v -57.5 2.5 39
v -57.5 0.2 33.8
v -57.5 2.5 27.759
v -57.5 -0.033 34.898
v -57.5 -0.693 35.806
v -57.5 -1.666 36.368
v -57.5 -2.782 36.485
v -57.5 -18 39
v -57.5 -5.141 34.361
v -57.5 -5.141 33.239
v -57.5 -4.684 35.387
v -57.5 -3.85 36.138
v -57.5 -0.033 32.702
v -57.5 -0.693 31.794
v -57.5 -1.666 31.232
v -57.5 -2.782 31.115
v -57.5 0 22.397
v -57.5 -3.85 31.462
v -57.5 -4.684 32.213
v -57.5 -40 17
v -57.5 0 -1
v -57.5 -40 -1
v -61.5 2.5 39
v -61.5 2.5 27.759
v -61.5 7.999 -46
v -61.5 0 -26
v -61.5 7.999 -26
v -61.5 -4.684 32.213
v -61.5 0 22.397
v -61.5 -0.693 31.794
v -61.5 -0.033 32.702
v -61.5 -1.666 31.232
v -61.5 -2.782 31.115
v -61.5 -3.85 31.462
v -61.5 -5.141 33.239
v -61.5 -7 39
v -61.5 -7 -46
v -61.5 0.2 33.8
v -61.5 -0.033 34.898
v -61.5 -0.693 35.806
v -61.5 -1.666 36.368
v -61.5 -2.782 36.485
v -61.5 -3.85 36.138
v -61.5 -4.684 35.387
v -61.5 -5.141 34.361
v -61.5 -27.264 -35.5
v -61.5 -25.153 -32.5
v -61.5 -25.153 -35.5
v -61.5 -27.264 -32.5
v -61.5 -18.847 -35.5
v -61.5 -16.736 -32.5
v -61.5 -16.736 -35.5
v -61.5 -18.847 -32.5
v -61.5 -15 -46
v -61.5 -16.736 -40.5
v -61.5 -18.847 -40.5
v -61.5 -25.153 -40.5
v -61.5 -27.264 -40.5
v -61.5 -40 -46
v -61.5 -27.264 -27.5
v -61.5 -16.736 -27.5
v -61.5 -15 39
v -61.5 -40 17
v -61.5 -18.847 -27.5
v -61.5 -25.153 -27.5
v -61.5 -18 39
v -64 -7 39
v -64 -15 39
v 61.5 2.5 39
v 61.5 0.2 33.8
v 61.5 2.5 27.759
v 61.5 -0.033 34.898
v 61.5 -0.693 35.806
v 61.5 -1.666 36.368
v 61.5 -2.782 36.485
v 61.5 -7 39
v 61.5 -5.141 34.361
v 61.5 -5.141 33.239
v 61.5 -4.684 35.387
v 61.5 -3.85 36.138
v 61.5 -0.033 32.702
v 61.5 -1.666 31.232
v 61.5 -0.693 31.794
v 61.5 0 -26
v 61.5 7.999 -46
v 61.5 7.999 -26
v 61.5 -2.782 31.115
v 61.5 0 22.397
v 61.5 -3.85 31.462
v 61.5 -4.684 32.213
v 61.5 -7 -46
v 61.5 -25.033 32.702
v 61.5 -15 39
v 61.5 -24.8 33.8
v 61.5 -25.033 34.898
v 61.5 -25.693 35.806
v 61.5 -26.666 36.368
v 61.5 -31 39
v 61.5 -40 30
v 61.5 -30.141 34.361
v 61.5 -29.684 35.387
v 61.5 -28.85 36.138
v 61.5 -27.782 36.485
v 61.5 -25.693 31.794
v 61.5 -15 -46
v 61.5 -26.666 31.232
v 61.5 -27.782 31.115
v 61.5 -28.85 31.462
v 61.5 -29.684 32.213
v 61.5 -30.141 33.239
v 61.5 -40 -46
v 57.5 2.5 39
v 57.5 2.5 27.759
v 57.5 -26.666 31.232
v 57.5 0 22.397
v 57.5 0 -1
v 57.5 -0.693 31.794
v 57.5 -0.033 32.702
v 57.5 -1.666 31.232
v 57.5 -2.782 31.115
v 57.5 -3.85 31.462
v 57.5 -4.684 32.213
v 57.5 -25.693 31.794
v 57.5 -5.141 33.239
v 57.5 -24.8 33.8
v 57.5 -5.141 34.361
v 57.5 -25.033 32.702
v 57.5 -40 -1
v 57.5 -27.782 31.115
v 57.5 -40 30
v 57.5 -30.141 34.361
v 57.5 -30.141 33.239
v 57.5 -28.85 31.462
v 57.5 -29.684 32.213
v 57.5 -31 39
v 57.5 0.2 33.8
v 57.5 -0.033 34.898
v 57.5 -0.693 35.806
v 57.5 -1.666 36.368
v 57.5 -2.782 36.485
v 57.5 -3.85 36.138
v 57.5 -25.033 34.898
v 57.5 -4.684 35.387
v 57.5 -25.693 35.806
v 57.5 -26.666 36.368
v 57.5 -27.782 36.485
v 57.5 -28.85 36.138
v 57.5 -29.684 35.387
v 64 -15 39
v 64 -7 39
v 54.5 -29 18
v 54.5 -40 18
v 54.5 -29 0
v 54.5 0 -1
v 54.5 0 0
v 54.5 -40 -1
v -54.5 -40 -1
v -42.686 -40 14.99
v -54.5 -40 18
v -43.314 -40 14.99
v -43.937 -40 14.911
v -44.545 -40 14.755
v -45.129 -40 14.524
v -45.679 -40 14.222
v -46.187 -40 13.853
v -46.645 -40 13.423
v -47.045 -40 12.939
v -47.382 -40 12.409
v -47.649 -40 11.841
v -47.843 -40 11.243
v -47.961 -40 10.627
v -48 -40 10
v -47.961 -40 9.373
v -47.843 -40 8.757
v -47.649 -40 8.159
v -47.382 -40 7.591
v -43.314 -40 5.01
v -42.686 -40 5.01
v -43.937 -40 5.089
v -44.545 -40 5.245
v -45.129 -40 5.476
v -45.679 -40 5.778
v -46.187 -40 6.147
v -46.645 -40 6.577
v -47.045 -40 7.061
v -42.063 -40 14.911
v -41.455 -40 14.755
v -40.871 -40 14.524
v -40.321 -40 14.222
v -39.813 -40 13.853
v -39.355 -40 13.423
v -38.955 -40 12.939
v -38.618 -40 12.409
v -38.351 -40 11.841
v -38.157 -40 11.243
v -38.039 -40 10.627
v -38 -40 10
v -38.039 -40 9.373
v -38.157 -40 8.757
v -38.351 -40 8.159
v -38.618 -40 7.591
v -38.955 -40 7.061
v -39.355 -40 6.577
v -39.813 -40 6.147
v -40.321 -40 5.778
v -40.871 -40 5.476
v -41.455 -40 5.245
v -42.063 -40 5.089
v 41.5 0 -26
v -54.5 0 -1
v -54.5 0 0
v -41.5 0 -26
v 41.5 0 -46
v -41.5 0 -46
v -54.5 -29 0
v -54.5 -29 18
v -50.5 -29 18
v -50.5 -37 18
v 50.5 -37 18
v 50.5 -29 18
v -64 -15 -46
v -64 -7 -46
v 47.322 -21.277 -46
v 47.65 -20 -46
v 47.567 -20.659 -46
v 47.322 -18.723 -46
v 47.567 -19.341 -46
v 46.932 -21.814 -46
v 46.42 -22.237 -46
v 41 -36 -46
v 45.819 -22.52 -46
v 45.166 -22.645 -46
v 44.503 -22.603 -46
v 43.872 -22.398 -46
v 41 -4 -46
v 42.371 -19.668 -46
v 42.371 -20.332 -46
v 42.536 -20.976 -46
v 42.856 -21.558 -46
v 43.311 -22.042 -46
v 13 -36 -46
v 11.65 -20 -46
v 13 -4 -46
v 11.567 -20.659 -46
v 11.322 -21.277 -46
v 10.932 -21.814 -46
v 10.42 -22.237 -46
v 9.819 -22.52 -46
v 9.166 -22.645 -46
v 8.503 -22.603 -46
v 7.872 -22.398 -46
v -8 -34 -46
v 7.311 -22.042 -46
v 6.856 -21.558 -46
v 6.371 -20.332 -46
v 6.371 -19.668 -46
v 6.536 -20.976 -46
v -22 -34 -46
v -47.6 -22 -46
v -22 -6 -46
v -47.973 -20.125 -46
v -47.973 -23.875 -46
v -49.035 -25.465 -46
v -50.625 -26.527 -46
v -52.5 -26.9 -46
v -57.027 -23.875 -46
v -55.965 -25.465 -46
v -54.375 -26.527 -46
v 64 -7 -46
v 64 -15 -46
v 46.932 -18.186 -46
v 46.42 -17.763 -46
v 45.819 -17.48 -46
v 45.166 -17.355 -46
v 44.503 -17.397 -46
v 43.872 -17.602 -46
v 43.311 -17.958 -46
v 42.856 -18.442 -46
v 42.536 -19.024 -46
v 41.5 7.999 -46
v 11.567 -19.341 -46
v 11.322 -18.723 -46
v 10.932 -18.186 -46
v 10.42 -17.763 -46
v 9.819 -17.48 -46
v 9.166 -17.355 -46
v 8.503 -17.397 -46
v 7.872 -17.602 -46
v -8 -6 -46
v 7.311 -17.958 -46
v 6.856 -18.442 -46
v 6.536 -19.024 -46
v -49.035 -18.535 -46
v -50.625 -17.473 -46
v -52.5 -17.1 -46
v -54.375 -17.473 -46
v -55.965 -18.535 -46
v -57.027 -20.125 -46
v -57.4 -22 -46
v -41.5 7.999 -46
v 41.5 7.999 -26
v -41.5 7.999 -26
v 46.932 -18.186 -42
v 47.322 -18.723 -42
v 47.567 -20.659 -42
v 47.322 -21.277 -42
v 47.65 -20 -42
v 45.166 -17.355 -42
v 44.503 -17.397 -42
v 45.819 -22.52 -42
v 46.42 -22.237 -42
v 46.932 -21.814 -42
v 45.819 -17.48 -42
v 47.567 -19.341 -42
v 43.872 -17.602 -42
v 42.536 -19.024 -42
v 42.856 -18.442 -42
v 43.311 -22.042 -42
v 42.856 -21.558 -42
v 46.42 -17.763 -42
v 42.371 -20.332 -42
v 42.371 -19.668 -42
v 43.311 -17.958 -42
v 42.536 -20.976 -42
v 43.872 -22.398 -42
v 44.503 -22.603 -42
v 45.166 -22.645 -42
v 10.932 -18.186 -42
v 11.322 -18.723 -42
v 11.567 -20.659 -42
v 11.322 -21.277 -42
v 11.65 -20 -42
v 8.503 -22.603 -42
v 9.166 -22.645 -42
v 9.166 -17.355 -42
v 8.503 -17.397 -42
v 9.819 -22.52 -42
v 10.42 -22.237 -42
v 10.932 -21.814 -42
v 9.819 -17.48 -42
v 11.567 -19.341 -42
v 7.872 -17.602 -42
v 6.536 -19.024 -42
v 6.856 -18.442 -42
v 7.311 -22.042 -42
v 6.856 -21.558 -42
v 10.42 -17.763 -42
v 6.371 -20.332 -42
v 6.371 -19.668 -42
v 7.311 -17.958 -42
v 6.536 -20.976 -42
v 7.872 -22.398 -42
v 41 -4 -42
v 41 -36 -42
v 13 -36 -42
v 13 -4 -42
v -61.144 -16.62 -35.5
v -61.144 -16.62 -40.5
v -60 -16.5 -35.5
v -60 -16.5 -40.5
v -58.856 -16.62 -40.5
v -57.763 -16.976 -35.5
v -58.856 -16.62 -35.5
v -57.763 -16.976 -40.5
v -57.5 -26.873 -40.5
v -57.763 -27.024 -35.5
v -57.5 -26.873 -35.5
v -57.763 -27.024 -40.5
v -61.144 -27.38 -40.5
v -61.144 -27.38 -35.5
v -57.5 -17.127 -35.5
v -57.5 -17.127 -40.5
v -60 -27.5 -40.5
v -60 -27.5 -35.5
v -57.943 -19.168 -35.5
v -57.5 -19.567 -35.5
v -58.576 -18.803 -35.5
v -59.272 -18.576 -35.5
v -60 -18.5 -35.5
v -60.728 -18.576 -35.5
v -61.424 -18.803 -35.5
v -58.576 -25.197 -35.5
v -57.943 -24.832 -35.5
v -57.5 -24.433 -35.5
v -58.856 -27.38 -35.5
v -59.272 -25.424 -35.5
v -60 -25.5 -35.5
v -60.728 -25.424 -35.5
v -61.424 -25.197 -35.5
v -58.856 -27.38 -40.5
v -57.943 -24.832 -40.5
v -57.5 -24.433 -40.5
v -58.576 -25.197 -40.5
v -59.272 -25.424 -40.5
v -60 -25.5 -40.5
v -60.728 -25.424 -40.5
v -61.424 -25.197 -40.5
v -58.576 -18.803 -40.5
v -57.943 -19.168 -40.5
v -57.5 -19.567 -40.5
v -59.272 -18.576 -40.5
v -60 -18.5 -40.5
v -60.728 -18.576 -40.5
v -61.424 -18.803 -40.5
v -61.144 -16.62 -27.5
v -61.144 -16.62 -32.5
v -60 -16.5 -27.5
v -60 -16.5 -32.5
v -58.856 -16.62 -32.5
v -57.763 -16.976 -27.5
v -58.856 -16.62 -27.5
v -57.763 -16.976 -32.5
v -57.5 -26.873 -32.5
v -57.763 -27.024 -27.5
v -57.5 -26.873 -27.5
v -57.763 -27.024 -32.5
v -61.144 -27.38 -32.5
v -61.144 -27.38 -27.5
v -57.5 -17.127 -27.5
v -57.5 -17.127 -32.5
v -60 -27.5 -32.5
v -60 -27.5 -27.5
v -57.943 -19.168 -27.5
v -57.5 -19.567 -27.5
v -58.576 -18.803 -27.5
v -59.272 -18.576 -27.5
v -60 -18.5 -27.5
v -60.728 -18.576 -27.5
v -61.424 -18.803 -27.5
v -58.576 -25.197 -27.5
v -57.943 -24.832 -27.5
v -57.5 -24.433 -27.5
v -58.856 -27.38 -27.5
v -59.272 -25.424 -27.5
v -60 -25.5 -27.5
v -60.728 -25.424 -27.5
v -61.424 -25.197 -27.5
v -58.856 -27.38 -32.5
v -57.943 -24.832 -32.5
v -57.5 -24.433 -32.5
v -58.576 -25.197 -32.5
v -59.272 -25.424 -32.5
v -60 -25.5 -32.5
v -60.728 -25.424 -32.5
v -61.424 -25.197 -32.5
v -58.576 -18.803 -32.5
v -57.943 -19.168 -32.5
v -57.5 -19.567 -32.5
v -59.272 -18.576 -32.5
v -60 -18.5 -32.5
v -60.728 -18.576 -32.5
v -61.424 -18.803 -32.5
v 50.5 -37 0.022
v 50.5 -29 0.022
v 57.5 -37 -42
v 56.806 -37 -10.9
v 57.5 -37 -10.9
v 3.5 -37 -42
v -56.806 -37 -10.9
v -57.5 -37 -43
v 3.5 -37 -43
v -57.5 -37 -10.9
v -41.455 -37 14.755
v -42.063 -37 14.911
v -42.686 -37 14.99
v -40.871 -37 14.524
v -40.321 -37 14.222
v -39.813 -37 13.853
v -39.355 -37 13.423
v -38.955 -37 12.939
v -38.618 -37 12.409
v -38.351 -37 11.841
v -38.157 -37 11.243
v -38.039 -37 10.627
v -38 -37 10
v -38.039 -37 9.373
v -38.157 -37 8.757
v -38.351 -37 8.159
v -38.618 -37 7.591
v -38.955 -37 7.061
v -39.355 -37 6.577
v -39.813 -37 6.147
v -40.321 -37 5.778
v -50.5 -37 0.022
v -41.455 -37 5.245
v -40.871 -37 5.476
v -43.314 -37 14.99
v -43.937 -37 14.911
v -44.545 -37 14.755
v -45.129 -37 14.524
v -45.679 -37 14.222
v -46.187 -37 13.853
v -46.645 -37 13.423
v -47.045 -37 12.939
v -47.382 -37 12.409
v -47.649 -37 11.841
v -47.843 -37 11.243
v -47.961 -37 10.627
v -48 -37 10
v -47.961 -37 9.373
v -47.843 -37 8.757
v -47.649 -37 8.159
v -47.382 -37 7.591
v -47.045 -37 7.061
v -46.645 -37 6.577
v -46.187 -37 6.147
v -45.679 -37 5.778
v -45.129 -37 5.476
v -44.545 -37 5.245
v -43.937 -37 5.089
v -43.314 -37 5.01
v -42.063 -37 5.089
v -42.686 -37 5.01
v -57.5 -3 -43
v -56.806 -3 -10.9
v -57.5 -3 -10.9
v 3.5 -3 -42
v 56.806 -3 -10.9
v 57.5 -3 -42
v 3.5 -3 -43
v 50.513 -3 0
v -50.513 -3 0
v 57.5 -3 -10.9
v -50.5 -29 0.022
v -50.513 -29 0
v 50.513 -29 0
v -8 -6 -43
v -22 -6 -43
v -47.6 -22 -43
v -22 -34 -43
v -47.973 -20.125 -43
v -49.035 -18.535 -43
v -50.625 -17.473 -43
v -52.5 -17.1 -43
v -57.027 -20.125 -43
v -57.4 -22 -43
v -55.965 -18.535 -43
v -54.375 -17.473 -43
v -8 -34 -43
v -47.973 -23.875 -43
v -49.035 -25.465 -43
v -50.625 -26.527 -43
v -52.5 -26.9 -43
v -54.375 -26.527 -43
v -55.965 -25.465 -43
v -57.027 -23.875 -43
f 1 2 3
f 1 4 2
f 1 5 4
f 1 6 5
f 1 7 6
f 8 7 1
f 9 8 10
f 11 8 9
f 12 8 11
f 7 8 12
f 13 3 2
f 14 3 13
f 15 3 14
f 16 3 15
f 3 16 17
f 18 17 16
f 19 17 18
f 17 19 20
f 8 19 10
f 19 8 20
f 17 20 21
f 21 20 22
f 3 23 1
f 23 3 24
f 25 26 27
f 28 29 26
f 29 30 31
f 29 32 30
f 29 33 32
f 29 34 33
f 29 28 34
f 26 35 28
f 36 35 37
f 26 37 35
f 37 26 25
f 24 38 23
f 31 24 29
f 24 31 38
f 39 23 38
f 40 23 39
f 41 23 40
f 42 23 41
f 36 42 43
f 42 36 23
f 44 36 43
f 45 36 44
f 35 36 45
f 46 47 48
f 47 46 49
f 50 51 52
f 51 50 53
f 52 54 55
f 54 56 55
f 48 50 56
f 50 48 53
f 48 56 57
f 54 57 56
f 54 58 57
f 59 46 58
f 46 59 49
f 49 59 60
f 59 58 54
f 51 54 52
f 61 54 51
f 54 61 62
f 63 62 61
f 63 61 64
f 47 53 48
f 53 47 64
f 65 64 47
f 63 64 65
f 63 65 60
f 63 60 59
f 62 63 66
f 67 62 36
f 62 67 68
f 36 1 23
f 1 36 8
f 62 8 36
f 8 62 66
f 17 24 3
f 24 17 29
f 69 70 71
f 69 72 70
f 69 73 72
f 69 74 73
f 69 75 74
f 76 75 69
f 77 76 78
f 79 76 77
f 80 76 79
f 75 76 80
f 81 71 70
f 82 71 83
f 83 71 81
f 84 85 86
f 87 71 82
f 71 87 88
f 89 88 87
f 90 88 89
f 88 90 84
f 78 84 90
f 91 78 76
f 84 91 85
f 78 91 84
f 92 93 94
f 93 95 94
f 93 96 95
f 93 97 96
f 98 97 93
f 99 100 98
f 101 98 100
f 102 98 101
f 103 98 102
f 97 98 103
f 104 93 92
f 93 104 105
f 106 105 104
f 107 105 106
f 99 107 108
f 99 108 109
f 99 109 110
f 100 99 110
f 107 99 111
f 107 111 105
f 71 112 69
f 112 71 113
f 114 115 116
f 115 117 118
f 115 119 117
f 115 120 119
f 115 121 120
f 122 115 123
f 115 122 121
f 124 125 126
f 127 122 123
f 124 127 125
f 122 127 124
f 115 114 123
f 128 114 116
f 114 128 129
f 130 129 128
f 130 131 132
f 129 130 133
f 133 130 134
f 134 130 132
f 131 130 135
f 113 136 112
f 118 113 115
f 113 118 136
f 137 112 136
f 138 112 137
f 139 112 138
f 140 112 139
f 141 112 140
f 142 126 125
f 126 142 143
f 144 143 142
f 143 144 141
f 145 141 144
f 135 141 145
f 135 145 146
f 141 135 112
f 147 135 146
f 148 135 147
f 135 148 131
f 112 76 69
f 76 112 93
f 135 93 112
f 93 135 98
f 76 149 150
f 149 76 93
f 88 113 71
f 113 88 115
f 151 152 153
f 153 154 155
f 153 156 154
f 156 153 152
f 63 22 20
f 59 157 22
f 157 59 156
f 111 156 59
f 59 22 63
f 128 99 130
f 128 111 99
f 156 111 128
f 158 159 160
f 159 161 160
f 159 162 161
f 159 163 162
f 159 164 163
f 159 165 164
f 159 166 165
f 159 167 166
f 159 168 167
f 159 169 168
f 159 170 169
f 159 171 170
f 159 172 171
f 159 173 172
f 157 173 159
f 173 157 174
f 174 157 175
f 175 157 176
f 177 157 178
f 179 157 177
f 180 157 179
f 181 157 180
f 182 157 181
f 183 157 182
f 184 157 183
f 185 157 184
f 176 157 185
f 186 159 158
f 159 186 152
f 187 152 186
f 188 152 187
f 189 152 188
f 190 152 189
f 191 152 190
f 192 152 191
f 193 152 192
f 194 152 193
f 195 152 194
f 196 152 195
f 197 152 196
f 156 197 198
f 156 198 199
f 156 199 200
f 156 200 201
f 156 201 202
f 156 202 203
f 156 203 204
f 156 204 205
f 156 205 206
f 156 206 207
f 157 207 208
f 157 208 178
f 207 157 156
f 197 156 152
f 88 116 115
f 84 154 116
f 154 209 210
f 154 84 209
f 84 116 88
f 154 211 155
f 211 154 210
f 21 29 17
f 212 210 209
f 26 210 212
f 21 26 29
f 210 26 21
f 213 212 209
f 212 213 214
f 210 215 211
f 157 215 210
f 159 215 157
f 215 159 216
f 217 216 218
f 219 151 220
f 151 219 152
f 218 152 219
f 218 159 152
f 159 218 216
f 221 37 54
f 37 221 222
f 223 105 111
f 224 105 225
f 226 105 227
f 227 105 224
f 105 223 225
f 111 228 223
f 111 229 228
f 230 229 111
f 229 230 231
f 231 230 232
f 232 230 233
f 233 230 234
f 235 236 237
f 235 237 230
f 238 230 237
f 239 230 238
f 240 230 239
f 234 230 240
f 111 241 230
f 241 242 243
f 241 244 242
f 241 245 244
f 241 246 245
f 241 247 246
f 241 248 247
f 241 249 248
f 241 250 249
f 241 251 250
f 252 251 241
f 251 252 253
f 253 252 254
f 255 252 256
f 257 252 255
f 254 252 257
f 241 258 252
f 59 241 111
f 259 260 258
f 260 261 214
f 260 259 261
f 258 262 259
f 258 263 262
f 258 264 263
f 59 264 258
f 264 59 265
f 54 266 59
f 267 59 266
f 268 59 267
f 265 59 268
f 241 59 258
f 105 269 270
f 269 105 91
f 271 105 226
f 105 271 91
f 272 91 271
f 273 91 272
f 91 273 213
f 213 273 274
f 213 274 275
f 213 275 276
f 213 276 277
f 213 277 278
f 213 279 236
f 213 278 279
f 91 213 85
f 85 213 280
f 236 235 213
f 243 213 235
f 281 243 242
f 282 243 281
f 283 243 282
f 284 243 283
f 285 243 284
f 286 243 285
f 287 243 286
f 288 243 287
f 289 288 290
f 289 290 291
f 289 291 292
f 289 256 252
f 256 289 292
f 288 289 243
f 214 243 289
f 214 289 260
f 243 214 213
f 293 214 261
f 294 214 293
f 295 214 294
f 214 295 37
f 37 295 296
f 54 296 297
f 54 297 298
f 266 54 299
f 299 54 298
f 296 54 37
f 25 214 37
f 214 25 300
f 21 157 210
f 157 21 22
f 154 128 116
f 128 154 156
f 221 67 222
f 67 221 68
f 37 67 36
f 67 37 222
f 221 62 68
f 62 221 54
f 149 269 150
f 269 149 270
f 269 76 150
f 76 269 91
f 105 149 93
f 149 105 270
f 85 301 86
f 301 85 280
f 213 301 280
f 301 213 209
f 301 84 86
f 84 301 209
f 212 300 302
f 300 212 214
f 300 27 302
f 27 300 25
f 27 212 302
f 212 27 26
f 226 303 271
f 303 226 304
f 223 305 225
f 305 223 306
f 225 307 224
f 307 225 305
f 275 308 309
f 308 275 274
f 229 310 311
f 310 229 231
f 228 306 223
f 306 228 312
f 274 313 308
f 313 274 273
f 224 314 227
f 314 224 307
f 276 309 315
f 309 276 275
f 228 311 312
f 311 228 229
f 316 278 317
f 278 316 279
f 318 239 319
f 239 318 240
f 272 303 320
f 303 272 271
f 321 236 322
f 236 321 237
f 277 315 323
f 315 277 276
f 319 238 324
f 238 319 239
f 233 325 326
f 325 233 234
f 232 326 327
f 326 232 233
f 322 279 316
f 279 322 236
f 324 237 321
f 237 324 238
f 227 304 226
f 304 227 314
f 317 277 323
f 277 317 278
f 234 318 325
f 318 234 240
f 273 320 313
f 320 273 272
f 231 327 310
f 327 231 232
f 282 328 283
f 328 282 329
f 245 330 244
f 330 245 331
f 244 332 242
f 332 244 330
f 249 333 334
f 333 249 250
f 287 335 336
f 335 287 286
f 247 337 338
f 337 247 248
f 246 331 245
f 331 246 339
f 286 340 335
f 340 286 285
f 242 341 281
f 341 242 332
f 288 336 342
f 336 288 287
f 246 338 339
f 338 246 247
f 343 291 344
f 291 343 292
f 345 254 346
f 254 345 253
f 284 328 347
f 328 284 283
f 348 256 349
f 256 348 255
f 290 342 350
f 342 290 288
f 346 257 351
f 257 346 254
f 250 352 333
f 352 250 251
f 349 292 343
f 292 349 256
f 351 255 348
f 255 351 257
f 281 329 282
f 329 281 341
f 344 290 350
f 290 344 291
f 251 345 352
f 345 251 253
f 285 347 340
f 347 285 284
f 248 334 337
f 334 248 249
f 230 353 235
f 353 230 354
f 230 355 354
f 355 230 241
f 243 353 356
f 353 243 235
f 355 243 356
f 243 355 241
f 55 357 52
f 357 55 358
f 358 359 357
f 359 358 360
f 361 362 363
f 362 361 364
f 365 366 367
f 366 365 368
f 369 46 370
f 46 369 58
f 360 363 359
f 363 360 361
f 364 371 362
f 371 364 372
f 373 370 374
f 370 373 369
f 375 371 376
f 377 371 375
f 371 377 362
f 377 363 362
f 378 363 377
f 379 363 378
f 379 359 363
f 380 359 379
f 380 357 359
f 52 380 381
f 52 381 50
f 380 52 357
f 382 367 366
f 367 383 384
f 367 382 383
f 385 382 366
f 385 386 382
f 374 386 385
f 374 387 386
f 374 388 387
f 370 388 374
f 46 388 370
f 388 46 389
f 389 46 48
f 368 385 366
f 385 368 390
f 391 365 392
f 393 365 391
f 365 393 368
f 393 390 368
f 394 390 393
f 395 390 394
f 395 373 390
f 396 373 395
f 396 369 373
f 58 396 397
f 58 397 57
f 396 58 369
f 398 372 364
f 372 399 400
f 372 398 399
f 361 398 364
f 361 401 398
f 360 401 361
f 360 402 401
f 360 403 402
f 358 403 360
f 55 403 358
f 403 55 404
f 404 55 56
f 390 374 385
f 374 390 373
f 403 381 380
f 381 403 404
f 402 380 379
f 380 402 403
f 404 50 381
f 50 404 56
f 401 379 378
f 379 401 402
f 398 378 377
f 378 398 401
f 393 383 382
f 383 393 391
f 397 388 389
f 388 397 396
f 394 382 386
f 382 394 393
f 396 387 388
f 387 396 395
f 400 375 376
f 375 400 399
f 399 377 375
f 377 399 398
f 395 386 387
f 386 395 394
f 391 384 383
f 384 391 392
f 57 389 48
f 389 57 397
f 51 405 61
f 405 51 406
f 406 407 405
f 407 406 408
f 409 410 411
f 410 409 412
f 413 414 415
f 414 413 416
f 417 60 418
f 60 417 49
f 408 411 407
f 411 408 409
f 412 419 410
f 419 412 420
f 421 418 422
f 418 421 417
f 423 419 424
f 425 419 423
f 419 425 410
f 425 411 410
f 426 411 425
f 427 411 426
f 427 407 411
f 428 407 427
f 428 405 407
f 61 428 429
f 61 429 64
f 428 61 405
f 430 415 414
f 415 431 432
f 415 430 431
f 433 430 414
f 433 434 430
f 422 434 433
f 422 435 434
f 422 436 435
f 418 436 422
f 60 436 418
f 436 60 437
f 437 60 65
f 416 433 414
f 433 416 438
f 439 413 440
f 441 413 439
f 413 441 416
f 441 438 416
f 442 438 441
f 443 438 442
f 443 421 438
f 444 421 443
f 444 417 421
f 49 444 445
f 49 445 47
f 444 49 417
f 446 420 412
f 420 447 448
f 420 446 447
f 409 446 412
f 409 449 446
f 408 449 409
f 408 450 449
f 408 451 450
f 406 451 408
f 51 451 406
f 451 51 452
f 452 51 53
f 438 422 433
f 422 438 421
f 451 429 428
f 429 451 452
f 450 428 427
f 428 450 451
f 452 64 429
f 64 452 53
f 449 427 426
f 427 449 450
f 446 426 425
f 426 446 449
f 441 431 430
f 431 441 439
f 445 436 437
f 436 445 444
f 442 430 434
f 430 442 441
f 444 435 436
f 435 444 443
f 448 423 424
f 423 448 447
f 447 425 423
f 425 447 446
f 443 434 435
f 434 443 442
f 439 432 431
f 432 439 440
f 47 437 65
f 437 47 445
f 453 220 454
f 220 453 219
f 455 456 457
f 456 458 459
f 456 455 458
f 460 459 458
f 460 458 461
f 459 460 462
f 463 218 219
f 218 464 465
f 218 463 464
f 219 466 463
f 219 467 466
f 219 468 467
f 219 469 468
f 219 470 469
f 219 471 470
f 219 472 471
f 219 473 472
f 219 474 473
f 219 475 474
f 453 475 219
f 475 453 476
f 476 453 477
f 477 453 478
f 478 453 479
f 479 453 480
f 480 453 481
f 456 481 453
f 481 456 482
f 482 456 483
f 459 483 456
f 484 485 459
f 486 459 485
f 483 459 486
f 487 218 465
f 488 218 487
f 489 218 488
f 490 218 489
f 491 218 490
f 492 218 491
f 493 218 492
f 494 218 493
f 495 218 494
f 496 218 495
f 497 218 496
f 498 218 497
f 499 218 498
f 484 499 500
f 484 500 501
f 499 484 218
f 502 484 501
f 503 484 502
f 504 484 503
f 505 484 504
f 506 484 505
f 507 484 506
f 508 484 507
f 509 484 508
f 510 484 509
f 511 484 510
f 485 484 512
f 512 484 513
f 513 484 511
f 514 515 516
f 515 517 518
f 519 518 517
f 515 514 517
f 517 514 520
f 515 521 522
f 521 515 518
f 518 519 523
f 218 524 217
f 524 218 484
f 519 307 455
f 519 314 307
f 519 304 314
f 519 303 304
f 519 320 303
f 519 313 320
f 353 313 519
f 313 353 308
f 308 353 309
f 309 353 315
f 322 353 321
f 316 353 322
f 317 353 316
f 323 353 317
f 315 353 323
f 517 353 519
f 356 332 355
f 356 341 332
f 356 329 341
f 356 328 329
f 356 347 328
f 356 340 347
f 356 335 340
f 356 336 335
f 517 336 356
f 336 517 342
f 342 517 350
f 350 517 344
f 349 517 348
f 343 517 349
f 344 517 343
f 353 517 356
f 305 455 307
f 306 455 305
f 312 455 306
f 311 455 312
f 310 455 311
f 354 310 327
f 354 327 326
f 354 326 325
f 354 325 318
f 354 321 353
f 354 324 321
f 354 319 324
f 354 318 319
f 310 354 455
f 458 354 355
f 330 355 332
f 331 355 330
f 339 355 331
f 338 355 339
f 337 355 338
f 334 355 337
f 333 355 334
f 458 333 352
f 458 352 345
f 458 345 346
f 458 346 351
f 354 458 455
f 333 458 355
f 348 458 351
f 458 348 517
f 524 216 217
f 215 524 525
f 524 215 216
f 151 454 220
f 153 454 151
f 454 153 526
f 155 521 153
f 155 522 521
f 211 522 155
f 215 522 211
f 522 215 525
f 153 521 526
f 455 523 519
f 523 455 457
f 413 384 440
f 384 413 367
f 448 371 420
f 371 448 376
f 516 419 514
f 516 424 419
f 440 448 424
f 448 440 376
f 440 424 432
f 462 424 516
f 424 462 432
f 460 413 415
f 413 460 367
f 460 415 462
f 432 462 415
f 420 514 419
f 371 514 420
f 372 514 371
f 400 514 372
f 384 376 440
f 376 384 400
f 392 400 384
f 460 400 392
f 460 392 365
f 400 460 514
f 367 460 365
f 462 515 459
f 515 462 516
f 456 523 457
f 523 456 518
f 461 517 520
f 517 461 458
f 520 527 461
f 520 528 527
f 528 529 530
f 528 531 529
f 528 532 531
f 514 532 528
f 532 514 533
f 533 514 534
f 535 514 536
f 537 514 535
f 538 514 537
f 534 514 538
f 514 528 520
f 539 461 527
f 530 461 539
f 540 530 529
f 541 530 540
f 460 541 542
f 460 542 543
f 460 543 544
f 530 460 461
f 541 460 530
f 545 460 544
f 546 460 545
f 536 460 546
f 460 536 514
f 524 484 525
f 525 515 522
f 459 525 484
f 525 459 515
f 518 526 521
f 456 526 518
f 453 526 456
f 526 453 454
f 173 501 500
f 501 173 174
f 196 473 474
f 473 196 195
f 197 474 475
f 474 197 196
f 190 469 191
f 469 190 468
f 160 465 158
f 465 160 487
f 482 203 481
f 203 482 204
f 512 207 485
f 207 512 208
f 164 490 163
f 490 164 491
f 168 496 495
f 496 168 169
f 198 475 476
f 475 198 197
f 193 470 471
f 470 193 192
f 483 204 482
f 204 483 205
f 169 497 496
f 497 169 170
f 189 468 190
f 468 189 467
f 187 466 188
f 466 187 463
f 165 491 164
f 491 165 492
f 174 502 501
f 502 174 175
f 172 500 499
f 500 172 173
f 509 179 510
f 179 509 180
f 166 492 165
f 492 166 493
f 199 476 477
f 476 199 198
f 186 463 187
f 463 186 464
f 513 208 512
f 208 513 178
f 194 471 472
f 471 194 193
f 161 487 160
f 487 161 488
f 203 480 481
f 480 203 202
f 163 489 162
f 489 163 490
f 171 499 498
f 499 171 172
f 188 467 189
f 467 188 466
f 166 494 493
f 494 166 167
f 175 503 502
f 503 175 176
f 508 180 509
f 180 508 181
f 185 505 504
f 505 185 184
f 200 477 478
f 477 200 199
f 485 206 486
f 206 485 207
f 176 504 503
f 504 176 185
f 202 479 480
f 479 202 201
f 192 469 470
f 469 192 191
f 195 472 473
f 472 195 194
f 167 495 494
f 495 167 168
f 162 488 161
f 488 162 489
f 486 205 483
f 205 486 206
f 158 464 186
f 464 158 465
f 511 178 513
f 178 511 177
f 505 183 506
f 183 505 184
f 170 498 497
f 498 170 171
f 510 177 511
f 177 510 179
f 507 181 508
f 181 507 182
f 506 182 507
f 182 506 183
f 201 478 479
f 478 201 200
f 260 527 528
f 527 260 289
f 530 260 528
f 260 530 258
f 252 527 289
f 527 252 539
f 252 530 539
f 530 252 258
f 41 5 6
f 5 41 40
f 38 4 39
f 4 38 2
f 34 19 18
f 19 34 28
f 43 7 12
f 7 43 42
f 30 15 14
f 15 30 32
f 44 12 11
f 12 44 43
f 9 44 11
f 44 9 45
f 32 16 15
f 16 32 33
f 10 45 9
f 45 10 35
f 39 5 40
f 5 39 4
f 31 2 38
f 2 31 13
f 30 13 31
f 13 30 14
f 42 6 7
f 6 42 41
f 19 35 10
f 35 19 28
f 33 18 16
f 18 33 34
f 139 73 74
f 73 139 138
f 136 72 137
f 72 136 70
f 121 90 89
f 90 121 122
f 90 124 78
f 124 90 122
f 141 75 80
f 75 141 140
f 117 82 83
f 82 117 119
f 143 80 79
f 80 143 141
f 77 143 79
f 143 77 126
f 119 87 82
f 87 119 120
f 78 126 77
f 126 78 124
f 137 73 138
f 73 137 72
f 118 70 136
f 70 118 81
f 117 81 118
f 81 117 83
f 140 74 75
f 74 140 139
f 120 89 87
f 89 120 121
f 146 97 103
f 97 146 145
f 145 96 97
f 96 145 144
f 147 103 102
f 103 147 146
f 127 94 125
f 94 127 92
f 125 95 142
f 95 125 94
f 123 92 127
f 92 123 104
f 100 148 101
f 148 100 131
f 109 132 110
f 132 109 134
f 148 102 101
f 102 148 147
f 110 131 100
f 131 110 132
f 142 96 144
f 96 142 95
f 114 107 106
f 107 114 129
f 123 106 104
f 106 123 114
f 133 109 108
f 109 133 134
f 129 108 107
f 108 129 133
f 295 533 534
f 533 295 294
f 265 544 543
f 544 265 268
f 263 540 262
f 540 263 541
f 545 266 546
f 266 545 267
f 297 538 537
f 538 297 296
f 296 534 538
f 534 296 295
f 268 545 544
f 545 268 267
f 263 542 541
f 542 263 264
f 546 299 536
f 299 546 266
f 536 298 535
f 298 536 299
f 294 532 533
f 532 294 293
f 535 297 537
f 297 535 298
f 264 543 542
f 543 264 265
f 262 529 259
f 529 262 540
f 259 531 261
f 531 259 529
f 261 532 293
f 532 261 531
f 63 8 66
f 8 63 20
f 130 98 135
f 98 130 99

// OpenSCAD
module psu(){
union(){
	difference(){
		translate([-114/2,0,-8])cube([114,200,50]);
		translate([-55,-0.01,2.01])cube([110,18,40]);
	}
	translate([-38,-0.01,2.01])cube([90,18,9]);
	translate([-37.5,2,2.01])
		for( i=[0:8]) translate([i*10,0,0])
		cube([9,10,10]);
}
translate([-65,32,5])rotate([0,90,0])cylinder(r=2,$fn=15,h=130);
translate([-35,32,30])rotate([0,90,0])cylinder(r=2,$fn=15,h=100);
translate([-114/2+32,32,-16])rotate([0,0,0])cylinder(r=2,$fn=15,h=15);
translate(){
translate([-57,1.5+6,30-12])rotate([0,90,0])oval();
translate([-57,1.5+6+7,30-12])rotate([0,90,0])oval();
translate([-57,1.5+6+14,30-12])rotate([0,90,0])oval();
translate([55,1.5+6,30-12])rotate([0,90,0])oval();
translate([55,1.5+6+7,30-12])rotate([0,90,0])oval();
translate([55,1.5+6+14,30-12])rotate([0,90,0])oval();
}
}

*%psu();
*enclosure();
module plug(){
cube([28,41,32],center=true);
for(i=[-1,1])translate([-18*i,-11,0])rotate([90,0,0])cylinder(r=5.3/2,h=10,$fn=25);
}
module switch(){
cylinder(r=20.5/2,h=39);
translate([0,-2.4/2,0])cube([11.5,2.4,39]);
}
module rswitch(){
translate([0,0,39/2])cube([28,14,39],true);
}

module clover(d=2,x=1.2){
for(i=[-1,1])
	for(j=[-1,1])
		translate([i*x,j*x])
			cylinder(r=d,h=30);

}

module ring(d=10,h=4,o=1.5){
difference(){
cylinder(r=d,h=h,center=true,$fn=30);
cylinder(r=d-o,h=h+1,center=true,$fn=30);


}

module support(){
translate([-63,0,0])cube([3,8,84]);
translate([63,0,0])cube([3,8,84]);


}

}
module oval(rad=3,len=21,w=2,fn=20){
translate([len/2,0,0])cylinder(r=rad/2,h=w,$fn=fn);
translate([-len/2,0,0])cylinder(r=rad/2,h=w,$fn=fn);
translate([0,0,w/2])cube([len,rad,w],center=true);
}
module enclosure(){
difference(){
union(){
translate([-109/2,-46,0])cube([109,64,40]);
translate([-115.5/2,-46,0])cube([115.5,45,40]);
translate([-109/2-7,-46,0])cube([4,85,40]); // extented Y by 1
translate([-64,39,7])rotate([90,0,0])cube([3,8,85]);
translate([61,39,7])rotate([90,0,0])cube([3,8,85]);
difference(){
	translate([-109/2-7,19,-2.5])cube([4,20,20]);
	translate([-109/2-7.25,17,-3]) rotate([-25,0,0]) cube([4.5,10,5]);
}
translate([109/2+3,-46,0])cube([4,85,40]); // extended Y by 1
difference(){	
	translate([109/2+3,19,-2.5])cube([4,20,20]);
	translate([109/2+2.75,17,-3]) rotate([-25,0,0]) cube([4.5,10,5]);
}
translate([34.5+7,-46,-7.999])cube([20,20,8]);
translate([-61.5,-46,-7.999])cube([20,20,8]);
}
translate([-101/2,-42,3])cube([101,60.1,34]);
translate([-110/2,0,-5])cube([110,30,34]);
translate([-115/2,-42,3])cube([115,31.1,34]);
translate([-115/2,-43,3])cube([61,31.1,34]);
translate([-22.8,-32,3])rotate([0,0,60])cube([40,40,34]);
translate([22.8,-32,3])rotate([0,0,30])cube([40,40,34]);

translate([-101/2,0.01,-0.01])cube([103,18,16]);
translate([-43,10,20])cylinder(r=5,h=30,$fn=50);

translate([27,-26,20])plug();
translate([-15,-8,20])rotate([90,-90,0])rswitch();

//Side mounting holes
//Moved all holes 1.8 in Y and 2.5 in Z. Enlarged the holes by 1
translate([-65,33.8,2.5])rotate([0,90,0])cylinder(r=2.7,$fn=15,h=15); 
translate([56,33.8,2.5])rotate([0,90,0])cylinder(r=2.7,$fn=15,h=15);
translate([56,33.8,27.5])rotate([0,90,0])cylinder(r=2.7,$fn=15,h=15);

translate([-52.5,-20,22])rotate([90,-90,0])cylinder(r=9.8/2,h=30);
translate([-66,42,15])rotate([45,0,0])cube([10,20,40]);
translate([56,42,28])rotate([45,0,0])cube([10,20,40]);
translate([-103,0,0])rotate([0,0,90]){
translate([-38,-43,22])rotate([0,90,0])ring(5.5,5,2);
translate([-30,-43,22])rotate([0,90,0])ring(5.5,5,2);
}
}
}



rotate([90,0,0])enclosure();
